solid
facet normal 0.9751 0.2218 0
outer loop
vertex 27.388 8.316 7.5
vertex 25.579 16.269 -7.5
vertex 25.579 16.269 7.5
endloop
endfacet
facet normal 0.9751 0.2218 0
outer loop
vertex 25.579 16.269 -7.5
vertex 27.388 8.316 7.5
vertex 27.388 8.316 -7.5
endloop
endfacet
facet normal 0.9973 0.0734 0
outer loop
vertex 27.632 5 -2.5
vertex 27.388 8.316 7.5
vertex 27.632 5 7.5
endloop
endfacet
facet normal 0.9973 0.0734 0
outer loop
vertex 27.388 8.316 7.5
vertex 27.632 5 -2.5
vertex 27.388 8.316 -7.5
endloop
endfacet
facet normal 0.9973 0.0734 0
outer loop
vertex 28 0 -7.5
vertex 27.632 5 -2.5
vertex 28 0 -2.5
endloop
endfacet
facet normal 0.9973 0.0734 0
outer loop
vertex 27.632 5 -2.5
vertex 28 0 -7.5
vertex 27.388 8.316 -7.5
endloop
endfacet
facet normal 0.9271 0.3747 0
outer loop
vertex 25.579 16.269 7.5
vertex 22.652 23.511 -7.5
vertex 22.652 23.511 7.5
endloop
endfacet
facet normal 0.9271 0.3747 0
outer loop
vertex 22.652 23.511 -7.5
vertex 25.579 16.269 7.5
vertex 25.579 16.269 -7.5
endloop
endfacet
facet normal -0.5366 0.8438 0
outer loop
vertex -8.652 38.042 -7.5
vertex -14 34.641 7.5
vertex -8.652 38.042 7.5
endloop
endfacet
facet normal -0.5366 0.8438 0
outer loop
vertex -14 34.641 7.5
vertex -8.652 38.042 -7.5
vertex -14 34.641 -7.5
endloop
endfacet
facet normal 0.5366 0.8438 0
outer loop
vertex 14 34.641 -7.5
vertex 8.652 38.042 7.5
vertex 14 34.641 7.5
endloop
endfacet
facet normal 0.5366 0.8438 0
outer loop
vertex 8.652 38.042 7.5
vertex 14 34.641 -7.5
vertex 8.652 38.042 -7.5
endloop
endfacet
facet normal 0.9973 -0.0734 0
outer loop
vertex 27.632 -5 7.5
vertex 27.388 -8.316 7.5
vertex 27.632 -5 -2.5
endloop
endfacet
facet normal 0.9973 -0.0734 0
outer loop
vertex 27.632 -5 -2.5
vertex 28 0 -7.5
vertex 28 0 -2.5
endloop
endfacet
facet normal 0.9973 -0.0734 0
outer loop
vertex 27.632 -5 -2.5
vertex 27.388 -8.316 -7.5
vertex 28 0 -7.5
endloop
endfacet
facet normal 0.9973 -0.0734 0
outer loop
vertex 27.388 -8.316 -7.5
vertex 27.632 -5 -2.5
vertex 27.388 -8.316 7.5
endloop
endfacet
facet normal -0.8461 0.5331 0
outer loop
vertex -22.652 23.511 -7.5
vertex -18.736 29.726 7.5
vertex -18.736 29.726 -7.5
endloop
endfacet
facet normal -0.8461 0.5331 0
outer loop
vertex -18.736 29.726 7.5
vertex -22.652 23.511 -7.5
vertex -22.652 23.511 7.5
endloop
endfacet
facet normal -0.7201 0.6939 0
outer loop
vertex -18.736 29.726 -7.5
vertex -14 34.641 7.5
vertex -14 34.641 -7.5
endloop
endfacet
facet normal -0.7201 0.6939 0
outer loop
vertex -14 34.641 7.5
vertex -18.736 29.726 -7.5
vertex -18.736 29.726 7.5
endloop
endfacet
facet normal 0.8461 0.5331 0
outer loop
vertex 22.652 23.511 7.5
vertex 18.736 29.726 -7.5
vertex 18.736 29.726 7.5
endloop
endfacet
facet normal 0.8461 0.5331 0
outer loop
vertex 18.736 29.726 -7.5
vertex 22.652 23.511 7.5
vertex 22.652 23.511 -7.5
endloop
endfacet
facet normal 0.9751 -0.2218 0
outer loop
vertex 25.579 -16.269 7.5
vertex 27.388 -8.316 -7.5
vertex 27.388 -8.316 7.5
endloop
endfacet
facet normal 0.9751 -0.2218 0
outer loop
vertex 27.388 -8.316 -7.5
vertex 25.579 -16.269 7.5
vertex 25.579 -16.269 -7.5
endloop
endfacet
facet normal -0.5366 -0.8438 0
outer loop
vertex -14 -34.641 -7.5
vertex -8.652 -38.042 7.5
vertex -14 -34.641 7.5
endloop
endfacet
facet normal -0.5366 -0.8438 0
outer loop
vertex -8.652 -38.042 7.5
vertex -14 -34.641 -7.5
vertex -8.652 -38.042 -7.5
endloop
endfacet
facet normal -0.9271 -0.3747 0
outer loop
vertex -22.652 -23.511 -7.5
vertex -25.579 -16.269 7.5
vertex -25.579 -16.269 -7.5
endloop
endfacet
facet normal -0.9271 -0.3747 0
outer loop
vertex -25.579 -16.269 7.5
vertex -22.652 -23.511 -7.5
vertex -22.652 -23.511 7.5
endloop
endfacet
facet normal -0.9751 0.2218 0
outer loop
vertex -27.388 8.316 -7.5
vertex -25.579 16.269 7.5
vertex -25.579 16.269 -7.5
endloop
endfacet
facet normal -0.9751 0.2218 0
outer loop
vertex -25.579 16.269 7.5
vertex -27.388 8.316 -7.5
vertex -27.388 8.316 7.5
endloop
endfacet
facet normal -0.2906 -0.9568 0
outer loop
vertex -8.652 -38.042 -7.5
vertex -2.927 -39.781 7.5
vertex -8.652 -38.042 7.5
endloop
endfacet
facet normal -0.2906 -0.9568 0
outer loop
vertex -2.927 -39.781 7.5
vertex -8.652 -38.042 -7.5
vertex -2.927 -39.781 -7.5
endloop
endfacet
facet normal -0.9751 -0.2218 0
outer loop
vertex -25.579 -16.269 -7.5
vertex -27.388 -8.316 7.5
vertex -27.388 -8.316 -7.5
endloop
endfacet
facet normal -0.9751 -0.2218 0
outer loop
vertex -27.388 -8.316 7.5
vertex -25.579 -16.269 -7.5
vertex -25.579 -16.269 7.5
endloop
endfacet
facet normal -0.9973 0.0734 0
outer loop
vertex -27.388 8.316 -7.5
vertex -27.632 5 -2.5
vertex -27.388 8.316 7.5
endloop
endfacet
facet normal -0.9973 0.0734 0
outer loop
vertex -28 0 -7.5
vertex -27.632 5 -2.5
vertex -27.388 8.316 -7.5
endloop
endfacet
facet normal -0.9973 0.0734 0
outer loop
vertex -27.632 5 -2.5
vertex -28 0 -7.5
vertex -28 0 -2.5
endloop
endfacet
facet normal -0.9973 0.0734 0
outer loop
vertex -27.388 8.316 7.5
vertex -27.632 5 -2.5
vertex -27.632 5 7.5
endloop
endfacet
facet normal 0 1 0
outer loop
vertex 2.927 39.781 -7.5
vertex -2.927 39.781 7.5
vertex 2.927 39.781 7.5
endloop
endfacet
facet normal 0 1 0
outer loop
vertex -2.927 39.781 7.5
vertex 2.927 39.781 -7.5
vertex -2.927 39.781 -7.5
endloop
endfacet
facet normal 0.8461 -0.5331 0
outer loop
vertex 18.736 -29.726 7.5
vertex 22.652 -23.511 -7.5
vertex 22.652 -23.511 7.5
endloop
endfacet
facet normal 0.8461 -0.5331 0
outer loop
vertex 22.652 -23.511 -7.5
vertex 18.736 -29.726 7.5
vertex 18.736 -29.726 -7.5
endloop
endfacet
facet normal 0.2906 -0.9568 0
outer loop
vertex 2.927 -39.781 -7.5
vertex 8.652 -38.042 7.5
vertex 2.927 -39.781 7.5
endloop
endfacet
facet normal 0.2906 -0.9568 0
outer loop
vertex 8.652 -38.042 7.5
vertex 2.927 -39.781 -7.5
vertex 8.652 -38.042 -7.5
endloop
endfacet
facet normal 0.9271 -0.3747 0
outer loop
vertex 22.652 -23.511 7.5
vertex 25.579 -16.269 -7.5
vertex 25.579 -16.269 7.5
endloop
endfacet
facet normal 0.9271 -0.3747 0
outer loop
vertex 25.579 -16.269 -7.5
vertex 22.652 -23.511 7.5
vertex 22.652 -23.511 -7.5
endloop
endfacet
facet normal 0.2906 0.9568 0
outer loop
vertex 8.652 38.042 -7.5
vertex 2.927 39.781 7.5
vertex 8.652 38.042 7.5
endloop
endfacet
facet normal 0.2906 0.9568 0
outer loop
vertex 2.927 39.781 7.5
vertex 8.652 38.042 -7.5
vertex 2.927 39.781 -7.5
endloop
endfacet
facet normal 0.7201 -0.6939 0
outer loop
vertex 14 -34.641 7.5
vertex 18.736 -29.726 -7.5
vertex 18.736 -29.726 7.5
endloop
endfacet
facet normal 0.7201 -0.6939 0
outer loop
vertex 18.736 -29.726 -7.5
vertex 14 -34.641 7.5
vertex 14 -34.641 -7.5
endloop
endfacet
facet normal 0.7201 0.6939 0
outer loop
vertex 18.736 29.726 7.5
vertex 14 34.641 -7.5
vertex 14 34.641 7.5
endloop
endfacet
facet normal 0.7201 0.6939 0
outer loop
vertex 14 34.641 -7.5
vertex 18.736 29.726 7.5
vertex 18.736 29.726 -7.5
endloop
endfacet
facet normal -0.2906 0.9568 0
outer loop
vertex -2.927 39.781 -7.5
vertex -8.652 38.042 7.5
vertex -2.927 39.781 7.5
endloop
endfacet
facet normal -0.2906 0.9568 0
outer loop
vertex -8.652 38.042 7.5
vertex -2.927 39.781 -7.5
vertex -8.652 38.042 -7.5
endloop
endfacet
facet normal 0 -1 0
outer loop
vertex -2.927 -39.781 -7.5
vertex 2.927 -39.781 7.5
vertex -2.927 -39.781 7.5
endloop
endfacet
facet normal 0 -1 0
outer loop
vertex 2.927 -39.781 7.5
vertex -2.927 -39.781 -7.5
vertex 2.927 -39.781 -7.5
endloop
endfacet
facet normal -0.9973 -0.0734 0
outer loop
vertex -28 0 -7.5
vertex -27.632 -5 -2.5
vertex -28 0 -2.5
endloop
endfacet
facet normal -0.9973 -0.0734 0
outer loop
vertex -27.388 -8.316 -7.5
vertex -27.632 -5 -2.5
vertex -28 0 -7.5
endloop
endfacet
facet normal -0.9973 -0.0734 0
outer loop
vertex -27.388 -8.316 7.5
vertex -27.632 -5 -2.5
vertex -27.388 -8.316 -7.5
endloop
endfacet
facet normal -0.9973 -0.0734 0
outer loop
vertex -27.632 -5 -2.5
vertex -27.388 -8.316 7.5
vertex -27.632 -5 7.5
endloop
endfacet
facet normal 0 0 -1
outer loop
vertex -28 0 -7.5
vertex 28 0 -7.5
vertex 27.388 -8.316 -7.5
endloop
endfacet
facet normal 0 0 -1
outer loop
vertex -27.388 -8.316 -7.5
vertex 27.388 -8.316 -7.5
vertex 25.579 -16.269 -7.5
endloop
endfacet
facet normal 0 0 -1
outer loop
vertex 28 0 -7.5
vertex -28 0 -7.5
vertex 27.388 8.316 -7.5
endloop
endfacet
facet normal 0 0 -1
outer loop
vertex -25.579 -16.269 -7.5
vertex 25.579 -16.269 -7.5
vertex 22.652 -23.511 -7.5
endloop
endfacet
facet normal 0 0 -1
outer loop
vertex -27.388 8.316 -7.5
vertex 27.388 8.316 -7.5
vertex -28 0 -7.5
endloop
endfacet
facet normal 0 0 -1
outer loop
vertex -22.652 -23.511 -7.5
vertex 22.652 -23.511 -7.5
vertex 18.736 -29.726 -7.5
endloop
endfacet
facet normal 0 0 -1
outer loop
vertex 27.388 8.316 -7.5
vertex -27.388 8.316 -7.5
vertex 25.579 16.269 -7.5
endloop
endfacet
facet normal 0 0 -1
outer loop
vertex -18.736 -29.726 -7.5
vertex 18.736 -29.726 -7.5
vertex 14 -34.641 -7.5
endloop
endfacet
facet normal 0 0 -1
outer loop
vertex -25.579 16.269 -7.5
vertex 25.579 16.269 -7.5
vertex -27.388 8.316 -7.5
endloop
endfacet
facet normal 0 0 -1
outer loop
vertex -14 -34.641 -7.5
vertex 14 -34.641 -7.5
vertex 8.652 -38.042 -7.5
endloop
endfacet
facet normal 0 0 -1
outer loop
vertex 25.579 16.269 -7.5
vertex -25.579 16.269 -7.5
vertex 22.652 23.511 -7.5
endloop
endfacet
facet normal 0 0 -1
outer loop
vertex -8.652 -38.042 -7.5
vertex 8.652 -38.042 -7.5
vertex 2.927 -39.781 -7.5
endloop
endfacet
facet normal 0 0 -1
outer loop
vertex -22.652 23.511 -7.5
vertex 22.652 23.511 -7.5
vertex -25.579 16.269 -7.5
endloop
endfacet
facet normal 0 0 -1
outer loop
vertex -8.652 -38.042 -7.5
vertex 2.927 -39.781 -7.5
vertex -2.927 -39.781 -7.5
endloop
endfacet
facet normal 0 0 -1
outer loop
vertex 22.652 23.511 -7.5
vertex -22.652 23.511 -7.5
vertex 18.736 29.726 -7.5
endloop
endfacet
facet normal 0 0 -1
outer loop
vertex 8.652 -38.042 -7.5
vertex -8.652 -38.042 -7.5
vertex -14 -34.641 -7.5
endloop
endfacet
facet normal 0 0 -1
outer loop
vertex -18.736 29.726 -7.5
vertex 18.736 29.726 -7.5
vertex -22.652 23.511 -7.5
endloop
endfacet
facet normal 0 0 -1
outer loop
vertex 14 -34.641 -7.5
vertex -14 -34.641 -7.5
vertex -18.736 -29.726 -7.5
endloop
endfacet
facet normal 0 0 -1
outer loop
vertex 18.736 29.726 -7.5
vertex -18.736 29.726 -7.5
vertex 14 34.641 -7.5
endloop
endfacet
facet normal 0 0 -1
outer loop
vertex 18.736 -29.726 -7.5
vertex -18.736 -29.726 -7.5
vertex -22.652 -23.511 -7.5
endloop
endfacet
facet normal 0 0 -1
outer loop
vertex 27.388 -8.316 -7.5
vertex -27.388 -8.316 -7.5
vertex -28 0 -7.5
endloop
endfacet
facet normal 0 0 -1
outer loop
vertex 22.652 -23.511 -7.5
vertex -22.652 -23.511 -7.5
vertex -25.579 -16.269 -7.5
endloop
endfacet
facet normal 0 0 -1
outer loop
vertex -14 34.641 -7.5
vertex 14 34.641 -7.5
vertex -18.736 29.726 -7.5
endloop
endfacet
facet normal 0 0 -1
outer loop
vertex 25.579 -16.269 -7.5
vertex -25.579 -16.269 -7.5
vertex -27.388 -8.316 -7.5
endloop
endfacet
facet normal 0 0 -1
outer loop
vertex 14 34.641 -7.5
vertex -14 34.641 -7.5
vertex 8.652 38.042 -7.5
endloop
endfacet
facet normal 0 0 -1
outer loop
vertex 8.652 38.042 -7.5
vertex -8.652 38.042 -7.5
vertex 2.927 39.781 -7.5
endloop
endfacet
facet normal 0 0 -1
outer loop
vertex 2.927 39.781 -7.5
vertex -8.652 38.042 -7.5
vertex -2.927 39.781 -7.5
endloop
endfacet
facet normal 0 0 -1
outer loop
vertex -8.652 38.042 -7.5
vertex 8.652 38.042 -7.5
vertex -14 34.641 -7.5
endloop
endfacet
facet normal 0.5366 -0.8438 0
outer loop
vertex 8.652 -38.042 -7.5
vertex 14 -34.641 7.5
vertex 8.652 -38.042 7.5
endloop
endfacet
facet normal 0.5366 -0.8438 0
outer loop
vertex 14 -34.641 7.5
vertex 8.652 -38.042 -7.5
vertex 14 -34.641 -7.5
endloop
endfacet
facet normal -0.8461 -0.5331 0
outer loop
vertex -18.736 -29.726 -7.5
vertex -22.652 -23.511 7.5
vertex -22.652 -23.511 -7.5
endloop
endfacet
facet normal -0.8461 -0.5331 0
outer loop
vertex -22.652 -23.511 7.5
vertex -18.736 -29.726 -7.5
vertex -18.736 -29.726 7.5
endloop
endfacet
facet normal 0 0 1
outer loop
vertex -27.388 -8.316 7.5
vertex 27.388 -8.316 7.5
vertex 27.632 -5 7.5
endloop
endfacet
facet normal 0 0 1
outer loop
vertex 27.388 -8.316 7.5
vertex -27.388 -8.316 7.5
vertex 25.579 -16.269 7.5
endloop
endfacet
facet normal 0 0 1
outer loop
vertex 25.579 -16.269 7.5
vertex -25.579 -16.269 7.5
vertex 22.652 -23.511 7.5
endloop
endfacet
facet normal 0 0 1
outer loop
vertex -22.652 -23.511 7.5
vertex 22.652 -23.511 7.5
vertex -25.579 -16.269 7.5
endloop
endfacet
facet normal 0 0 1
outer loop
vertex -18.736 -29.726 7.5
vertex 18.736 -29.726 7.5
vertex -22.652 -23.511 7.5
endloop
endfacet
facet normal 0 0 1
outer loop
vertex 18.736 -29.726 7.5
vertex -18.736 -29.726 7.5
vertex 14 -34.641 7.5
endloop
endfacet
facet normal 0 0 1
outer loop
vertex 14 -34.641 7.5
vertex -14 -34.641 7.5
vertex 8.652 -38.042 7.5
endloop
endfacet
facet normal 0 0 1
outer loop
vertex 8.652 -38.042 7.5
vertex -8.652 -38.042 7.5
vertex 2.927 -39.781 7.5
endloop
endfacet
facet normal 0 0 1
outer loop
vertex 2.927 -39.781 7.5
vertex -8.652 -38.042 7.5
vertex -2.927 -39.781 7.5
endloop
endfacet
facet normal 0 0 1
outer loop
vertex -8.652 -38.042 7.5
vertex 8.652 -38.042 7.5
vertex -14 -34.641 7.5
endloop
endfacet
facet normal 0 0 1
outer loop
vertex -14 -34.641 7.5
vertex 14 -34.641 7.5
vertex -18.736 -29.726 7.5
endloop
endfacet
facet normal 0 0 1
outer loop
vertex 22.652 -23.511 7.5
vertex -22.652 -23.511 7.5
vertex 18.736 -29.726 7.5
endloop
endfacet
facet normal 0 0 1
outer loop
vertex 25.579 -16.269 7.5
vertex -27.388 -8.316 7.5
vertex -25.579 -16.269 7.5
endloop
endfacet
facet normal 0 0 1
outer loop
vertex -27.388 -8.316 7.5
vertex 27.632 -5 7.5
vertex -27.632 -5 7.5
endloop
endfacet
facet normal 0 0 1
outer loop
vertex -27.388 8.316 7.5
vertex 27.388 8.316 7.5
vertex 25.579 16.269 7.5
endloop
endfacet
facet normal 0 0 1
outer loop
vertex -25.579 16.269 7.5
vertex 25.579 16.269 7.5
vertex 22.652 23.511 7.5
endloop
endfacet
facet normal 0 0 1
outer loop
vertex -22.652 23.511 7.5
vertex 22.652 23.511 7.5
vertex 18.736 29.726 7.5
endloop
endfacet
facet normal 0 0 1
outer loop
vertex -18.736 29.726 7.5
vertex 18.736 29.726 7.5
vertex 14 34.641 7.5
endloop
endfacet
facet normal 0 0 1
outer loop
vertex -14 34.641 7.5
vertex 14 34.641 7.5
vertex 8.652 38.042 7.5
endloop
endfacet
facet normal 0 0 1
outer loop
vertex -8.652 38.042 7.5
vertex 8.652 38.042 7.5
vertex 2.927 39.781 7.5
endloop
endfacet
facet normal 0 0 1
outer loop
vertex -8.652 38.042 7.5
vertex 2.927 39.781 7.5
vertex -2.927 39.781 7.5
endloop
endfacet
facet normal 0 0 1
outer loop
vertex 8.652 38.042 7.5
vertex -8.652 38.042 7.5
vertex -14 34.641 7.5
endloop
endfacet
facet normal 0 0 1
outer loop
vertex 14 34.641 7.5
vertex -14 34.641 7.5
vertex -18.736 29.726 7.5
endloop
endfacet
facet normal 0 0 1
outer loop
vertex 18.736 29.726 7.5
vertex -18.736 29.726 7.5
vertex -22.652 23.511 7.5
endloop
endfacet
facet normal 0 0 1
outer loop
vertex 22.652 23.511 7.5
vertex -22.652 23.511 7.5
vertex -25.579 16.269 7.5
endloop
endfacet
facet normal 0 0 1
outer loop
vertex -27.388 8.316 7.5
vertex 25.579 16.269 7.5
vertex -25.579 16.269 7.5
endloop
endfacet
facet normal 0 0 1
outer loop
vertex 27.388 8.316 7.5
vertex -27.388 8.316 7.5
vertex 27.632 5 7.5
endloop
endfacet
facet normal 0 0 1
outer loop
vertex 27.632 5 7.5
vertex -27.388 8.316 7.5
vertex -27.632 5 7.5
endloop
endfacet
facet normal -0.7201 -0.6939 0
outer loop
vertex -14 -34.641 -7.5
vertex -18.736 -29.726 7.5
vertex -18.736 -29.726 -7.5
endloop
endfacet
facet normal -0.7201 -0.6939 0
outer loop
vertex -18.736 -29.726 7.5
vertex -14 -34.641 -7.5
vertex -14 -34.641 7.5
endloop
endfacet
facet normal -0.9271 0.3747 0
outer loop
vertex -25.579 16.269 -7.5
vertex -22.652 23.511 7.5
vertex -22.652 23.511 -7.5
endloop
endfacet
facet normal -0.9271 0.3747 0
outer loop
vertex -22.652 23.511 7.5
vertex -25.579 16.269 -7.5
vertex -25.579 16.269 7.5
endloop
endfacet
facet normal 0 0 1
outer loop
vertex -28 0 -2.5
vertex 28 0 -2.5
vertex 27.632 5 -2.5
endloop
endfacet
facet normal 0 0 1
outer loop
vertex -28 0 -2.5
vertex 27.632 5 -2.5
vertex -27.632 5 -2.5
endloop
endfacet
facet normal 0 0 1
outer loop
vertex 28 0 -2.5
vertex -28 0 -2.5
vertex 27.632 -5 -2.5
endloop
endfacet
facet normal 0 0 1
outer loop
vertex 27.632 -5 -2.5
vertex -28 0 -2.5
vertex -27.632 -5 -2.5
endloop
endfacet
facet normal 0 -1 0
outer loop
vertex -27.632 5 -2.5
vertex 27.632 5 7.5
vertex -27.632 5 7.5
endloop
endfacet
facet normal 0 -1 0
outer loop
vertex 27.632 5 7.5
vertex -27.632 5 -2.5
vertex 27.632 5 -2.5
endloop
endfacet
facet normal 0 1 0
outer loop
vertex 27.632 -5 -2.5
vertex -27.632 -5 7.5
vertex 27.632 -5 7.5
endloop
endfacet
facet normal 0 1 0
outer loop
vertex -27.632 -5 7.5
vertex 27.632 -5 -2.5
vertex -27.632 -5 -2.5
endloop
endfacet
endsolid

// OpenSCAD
// 25mm at tightest
base = 5;

difference() {
    oval(28, 40, 15, true);
    translate([0, 0, 5])
        #cube([70,10,15], true);
}



module oval(w,h, height, center = false) {
    scale([1, h/w, 1]) cylinder(h=height, r=w, center=center);
}
